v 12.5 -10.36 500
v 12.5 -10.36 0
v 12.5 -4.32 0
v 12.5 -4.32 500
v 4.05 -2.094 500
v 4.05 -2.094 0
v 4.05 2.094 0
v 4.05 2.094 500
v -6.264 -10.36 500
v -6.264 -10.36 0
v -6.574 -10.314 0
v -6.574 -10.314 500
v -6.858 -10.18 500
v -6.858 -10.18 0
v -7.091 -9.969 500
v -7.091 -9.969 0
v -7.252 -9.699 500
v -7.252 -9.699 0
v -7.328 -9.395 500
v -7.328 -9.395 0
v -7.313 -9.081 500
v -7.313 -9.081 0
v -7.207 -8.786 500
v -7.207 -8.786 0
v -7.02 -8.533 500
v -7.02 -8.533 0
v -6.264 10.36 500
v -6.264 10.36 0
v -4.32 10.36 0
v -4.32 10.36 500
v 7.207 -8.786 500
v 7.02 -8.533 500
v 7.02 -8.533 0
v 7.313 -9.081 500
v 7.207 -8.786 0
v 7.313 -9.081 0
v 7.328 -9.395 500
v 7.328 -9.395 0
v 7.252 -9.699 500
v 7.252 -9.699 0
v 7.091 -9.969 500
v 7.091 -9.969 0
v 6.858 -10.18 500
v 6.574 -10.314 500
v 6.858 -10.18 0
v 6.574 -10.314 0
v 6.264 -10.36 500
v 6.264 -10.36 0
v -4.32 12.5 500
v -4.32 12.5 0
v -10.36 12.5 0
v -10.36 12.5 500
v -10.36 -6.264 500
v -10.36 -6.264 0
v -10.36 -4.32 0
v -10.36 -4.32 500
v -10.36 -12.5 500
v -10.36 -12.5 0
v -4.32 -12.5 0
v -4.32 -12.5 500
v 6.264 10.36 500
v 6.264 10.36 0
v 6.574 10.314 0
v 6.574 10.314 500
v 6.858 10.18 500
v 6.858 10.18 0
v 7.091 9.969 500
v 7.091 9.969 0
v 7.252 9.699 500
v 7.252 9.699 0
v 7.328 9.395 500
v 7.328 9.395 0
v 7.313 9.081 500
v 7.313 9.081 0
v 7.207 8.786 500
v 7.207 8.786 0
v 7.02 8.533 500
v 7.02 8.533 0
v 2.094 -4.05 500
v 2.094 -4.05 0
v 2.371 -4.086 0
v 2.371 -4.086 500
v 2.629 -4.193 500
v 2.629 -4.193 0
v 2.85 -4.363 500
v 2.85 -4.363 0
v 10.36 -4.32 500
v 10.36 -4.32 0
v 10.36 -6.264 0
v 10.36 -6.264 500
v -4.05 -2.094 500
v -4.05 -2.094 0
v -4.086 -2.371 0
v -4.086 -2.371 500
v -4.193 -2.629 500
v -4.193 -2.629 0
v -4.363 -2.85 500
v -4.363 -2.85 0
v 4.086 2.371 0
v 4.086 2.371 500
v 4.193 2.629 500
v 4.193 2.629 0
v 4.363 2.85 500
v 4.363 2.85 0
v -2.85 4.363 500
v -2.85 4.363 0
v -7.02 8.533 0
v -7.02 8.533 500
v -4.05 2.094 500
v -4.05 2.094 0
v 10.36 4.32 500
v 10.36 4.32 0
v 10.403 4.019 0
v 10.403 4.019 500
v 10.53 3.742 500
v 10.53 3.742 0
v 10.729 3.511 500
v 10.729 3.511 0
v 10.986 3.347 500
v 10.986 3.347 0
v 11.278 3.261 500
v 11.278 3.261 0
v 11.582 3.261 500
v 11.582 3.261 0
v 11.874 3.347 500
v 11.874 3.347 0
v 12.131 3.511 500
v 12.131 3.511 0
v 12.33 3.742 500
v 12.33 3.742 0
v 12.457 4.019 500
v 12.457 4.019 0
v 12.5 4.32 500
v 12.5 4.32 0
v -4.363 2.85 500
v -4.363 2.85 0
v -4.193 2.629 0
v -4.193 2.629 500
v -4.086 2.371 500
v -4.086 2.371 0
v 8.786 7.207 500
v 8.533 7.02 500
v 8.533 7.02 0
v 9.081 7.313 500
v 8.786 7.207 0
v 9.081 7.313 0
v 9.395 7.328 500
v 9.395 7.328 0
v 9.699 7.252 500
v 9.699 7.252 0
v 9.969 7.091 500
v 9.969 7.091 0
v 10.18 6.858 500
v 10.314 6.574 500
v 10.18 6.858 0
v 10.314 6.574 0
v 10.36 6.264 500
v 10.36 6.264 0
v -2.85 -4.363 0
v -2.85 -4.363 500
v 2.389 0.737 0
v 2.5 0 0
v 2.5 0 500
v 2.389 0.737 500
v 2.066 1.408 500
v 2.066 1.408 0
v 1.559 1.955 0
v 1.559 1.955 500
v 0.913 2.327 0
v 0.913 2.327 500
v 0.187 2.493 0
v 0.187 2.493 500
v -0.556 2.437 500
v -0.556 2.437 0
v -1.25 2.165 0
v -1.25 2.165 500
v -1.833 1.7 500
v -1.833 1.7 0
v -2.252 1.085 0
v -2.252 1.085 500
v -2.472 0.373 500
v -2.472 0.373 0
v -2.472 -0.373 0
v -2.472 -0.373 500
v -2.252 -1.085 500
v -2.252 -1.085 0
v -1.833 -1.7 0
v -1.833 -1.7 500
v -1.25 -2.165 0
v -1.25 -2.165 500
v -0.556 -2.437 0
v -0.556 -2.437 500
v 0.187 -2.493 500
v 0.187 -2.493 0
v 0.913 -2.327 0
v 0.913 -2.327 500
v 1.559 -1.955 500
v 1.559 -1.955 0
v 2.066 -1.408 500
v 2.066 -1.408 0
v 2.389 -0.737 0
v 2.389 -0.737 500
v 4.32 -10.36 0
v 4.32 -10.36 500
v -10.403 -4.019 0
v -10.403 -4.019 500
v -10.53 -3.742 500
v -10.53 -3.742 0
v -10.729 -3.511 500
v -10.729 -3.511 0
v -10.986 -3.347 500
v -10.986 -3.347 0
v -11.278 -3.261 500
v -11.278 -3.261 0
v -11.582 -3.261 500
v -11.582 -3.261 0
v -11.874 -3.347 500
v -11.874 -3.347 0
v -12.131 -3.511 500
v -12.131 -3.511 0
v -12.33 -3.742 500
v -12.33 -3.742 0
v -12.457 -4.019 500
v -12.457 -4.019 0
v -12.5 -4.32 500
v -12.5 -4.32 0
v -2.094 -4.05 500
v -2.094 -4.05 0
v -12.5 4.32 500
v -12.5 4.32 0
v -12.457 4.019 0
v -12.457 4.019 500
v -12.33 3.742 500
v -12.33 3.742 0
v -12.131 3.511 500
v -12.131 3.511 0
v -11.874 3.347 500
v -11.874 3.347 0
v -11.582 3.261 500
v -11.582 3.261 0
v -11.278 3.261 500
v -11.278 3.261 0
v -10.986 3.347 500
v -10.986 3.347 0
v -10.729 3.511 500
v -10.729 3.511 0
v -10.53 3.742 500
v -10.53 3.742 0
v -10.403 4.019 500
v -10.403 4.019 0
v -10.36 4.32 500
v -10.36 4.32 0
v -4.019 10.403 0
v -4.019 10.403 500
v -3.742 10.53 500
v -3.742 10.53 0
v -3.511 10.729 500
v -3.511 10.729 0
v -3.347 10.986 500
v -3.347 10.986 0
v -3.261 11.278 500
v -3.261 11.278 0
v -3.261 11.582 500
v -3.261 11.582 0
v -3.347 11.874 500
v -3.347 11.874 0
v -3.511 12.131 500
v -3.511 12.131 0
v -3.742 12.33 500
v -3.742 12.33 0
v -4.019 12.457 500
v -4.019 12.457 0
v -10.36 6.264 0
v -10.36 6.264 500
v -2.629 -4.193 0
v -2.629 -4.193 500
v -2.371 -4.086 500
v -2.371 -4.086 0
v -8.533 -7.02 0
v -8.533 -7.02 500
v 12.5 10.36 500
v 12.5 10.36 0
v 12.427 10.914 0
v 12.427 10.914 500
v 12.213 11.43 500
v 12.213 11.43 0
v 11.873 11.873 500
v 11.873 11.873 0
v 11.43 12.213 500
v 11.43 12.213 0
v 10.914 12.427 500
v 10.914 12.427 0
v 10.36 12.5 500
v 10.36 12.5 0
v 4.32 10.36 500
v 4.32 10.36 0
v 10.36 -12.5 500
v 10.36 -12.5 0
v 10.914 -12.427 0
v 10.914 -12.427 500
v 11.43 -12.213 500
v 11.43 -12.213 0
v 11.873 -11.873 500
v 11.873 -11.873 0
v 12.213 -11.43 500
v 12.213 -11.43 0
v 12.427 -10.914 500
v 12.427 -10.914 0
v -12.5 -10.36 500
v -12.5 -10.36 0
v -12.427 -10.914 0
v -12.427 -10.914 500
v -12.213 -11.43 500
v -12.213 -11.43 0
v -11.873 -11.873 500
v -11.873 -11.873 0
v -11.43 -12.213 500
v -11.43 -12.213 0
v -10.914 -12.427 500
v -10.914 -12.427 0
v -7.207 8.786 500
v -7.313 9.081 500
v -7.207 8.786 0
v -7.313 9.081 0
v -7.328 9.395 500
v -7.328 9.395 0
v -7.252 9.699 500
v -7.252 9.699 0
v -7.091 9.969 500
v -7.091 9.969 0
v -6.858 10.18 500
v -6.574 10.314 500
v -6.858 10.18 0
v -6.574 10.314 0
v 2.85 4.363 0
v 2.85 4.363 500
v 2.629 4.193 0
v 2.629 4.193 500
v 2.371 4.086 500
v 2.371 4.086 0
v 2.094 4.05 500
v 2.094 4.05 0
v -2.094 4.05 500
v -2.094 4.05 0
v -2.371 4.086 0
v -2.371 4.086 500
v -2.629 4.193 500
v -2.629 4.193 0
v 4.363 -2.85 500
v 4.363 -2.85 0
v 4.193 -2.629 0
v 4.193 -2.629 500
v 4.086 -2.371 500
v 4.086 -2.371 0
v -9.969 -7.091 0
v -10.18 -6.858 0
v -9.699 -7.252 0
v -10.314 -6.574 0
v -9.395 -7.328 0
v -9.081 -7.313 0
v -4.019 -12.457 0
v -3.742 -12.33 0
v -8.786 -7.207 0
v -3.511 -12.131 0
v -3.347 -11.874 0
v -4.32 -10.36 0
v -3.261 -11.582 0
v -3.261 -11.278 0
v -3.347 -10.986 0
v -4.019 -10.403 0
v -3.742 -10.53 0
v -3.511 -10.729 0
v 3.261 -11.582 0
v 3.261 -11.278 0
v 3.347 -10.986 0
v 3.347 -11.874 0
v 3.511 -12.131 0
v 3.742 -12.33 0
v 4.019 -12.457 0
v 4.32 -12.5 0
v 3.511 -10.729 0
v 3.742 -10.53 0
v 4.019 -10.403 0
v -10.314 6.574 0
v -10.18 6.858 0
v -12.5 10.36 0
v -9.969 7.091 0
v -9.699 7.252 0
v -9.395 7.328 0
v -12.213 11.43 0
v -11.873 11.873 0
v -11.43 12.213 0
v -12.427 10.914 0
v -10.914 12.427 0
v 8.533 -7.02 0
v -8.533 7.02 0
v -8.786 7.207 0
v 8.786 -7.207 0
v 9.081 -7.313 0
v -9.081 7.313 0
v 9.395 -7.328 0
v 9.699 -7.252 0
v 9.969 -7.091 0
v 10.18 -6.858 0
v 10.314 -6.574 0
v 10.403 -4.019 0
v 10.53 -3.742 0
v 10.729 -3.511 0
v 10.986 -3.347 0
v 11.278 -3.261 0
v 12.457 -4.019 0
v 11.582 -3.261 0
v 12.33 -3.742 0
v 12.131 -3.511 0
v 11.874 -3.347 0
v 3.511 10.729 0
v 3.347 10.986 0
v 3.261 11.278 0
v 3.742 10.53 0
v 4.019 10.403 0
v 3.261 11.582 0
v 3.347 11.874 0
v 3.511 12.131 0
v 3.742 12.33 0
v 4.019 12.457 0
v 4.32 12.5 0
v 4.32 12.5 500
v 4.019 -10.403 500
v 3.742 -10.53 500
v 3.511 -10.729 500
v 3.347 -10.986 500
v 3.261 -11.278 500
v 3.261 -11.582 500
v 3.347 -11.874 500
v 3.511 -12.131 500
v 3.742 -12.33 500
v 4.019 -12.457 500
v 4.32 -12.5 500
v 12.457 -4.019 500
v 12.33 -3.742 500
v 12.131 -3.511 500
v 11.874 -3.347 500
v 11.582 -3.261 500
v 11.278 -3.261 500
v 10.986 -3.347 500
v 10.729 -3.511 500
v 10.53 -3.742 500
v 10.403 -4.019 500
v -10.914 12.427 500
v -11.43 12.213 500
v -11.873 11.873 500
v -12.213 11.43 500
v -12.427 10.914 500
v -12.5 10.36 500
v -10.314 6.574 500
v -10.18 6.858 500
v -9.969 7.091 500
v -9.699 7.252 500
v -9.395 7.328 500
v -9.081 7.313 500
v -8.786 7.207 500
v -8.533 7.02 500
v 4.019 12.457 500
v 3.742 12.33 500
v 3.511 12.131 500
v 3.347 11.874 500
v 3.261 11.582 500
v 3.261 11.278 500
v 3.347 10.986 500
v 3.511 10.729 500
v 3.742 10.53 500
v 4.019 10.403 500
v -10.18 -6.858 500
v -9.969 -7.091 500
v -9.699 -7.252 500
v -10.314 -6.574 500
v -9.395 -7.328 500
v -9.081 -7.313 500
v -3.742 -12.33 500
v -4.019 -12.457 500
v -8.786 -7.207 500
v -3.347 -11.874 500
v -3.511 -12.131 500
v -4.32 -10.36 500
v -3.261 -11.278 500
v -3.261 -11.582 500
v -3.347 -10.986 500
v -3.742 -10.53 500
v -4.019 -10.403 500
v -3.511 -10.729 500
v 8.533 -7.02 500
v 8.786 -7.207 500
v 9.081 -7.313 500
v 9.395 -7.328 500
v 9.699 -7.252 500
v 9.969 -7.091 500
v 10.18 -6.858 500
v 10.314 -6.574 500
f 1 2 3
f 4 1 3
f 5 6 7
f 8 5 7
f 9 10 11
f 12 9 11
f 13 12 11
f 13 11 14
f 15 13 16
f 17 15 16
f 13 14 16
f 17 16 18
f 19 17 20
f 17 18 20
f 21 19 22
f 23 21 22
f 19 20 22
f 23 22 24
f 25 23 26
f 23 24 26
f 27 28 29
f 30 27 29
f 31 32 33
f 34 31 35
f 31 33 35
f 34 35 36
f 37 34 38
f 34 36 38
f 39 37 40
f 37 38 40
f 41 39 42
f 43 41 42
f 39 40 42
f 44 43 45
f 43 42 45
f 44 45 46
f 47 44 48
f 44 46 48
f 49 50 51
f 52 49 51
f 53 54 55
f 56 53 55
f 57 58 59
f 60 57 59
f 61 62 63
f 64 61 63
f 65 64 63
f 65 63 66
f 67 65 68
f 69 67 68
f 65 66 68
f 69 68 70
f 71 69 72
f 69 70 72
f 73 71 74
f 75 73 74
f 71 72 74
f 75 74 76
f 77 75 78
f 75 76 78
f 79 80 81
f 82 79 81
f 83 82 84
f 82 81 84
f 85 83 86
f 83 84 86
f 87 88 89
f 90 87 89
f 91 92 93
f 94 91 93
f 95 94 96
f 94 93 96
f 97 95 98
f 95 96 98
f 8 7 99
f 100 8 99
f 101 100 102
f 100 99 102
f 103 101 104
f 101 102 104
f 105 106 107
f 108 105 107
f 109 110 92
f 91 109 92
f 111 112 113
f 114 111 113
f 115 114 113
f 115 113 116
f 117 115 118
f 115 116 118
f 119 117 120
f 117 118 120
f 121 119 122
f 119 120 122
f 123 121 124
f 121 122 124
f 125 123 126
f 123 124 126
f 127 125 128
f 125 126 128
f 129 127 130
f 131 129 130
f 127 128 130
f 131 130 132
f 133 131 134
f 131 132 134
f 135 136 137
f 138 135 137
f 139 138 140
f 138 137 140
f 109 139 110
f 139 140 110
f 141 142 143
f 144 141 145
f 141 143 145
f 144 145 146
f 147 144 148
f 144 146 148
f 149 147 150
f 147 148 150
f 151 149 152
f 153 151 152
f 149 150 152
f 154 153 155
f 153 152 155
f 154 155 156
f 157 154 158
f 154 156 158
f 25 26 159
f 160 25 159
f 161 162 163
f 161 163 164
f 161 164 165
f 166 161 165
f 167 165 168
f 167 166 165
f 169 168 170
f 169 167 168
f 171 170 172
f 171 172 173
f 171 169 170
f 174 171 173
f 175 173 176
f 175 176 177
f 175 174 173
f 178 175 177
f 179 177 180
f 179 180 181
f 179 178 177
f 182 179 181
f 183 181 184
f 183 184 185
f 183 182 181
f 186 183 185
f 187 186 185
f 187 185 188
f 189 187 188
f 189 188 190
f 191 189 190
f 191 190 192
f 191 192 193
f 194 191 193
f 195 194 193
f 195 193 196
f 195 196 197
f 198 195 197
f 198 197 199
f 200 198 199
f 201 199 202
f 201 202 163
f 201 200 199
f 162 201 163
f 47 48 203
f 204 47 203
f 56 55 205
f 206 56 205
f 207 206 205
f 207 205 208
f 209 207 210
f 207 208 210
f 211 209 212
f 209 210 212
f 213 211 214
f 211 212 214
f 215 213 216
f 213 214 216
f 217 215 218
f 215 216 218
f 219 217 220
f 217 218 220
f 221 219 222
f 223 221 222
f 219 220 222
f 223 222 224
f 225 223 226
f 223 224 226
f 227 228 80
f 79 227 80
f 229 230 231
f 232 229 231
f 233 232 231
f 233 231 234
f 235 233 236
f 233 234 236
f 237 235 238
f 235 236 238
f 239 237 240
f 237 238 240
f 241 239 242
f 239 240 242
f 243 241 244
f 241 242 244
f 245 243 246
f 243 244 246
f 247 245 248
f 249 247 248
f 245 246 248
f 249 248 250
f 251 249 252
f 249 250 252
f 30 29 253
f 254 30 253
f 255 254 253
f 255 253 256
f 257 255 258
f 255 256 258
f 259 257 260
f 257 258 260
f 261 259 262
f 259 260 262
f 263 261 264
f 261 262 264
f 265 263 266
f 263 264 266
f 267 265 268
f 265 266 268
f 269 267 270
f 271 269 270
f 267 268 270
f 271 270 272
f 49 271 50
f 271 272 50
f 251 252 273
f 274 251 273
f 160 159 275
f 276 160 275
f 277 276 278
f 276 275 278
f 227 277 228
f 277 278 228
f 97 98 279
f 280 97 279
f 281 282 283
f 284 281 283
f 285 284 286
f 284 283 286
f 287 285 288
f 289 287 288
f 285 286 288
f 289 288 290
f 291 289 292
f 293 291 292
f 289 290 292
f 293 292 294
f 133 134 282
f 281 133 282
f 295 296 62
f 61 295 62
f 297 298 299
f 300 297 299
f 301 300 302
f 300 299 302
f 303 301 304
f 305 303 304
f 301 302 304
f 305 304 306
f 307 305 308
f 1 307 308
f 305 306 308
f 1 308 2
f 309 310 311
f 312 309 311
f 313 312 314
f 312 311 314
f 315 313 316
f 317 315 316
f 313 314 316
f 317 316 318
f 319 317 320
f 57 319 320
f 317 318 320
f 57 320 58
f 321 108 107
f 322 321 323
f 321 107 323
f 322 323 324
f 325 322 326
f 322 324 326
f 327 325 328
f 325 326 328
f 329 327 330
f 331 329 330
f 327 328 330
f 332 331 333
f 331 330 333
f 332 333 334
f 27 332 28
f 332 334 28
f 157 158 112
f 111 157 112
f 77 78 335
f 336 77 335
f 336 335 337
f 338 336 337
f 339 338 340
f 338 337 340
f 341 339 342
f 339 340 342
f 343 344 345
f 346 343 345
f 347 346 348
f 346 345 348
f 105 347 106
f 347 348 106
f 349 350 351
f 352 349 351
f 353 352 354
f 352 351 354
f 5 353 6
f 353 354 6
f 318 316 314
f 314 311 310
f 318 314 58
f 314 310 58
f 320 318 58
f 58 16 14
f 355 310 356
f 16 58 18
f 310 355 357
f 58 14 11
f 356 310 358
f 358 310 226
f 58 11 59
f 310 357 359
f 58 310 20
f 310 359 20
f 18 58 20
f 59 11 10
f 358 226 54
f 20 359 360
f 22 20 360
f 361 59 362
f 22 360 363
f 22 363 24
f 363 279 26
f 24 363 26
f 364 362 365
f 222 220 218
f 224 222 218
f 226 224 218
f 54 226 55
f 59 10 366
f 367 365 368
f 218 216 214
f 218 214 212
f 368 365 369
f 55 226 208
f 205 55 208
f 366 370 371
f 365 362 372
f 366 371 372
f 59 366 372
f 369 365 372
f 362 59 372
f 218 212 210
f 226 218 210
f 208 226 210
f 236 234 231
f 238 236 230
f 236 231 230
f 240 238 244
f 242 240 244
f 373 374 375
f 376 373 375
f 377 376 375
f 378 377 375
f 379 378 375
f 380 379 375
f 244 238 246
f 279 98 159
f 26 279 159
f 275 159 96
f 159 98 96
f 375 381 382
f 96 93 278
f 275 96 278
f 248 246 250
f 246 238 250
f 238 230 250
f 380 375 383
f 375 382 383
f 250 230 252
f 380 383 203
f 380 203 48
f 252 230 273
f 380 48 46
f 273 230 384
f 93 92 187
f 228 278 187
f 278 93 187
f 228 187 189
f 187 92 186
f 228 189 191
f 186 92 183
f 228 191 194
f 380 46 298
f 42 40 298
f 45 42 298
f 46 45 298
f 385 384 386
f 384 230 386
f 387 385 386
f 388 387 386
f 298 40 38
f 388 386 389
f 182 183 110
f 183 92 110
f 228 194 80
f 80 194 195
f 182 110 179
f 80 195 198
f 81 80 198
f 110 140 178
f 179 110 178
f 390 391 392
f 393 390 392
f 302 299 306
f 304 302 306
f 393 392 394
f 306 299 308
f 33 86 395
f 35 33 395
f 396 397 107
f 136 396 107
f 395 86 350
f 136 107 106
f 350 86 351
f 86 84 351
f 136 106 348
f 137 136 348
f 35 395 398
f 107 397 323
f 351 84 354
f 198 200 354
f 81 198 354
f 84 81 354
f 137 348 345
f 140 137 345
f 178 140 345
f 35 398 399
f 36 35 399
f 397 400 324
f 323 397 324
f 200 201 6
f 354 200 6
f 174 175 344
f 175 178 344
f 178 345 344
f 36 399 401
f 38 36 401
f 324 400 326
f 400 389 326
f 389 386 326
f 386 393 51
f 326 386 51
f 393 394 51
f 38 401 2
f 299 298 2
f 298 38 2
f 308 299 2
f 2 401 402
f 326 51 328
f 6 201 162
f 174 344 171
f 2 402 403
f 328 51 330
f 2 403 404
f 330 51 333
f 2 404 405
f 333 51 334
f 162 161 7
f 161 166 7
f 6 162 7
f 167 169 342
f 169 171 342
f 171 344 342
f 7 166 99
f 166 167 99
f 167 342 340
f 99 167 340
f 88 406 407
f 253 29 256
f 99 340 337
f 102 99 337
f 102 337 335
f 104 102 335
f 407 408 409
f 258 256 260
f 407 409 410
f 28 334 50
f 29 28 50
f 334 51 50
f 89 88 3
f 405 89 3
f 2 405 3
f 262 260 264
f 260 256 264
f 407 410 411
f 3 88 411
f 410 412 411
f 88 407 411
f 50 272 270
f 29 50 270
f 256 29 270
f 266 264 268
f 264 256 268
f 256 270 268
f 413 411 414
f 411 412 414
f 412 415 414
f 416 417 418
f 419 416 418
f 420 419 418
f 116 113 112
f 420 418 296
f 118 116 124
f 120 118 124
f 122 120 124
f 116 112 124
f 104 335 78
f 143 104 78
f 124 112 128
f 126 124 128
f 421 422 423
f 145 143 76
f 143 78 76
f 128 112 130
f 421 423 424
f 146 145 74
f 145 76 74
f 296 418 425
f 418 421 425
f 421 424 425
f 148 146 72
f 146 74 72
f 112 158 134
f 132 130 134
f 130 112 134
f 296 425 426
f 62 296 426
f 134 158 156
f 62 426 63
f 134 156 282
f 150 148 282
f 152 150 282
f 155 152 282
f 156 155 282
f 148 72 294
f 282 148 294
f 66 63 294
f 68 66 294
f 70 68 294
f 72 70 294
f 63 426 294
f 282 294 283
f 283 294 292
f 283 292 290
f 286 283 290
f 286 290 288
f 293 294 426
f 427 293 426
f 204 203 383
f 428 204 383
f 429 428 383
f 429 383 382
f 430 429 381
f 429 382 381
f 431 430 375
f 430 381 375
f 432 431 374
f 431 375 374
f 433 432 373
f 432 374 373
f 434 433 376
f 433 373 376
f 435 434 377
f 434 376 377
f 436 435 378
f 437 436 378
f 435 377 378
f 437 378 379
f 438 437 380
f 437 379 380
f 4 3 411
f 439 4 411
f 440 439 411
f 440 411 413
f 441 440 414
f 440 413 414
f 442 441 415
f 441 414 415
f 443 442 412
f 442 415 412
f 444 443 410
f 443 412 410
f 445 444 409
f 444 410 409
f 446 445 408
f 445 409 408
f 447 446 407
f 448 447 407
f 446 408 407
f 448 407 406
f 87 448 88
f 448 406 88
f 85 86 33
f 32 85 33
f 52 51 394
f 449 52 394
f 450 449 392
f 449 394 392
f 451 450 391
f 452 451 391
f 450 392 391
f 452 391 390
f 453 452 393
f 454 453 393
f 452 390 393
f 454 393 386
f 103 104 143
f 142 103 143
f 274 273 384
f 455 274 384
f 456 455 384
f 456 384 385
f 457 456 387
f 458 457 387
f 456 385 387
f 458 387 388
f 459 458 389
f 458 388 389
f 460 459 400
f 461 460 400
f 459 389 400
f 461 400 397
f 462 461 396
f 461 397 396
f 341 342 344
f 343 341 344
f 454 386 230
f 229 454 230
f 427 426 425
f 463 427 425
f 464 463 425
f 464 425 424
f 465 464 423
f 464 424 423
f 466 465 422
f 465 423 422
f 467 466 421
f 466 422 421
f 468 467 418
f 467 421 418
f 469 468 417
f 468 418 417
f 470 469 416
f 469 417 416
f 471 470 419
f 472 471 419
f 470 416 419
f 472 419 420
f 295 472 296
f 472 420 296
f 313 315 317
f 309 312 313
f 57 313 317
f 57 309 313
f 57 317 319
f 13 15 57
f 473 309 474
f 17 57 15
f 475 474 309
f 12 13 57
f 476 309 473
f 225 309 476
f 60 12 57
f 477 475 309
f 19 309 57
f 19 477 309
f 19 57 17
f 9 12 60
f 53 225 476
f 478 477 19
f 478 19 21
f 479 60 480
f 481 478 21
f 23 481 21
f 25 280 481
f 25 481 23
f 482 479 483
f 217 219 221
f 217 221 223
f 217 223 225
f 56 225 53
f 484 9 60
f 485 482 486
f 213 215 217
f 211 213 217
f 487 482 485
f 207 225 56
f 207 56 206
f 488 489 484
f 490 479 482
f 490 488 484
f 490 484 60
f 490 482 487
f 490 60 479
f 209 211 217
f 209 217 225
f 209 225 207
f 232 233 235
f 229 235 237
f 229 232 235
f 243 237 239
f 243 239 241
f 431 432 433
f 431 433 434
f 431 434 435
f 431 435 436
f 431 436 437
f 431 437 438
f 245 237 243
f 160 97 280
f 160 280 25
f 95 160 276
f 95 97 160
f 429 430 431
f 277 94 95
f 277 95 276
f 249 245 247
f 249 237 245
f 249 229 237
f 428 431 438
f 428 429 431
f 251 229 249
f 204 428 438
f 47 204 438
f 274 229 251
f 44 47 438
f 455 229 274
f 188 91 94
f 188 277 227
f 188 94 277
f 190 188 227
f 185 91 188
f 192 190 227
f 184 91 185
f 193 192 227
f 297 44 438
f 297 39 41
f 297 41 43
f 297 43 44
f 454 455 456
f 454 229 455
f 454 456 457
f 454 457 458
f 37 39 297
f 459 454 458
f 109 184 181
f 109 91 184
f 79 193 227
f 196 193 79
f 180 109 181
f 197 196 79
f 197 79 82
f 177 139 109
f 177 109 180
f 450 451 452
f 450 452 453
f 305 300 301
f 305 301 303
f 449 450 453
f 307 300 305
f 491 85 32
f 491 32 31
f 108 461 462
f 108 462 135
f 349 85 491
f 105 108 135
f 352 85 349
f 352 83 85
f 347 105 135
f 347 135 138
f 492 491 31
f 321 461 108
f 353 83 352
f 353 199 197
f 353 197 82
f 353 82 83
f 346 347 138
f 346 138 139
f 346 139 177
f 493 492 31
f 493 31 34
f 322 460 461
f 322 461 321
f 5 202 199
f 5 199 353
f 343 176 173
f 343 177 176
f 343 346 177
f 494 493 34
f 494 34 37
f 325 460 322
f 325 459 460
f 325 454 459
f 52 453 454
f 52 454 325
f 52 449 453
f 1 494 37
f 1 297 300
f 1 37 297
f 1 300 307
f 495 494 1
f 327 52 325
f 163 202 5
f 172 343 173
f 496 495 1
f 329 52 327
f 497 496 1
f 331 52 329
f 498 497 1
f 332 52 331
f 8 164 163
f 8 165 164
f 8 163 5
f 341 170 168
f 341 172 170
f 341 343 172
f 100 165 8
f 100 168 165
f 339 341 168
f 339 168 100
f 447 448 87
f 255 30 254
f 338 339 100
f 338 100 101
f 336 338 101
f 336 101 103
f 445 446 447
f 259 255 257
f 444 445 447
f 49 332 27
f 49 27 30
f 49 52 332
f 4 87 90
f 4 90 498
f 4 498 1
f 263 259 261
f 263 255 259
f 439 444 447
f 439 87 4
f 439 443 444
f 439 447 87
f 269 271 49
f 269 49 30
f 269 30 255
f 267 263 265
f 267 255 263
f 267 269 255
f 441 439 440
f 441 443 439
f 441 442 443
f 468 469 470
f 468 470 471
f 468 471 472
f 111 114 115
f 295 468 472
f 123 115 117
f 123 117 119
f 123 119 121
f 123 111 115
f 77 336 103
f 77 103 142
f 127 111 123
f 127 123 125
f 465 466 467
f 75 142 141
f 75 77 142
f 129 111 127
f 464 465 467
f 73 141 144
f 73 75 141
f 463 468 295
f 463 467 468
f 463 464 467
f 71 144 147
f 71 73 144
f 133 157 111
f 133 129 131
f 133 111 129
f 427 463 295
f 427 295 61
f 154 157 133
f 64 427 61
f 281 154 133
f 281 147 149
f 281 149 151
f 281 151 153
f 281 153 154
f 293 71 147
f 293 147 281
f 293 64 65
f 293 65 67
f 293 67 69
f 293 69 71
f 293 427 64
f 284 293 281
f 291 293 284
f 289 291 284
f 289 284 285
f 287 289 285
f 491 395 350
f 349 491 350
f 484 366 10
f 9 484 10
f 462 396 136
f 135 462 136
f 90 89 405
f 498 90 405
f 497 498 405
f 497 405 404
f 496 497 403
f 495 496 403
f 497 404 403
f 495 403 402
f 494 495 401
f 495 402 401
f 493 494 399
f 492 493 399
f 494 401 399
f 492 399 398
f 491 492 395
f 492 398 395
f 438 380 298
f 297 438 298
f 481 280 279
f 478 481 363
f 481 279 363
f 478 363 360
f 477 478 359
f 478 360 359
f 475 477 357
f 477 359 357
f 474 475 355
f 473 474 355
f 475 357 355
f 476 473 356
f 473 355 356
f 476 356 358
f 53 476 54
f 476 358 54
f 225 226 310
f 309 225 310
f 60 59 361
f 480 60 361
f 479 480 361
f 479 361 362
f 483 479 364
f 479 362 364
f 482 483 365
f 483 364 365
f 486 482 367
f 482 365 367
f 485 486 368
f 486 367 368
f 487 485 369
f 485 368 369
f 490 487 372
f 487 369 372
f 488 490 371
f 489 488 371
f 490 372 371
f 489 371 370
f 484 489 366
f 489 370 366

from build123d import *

# Parameters (mm, degrees)
F0_R     = 2.5
F1_DEPTH = 500


with BuildPart() as f1:
    # F0 (on Top) → F1 (new body)
    with BuildSketch(Plane.XY):
        with BuildLine():
            ThreePointArc((-10.36, 12.5), (-11.873209, 11.873209), (-12.5, 10.36))
            Line((-12.5, 10.36), (-12.5, 4.32))
            ThreePointArc((-12.5, 4.32), (-11.43, 3.25), (-10.36, 4.32))
            Line((-10.36, 4.32), (-10.36, 6.263583))
            ThreePointArc((-10.36, 6.263583), (-9.699471, 7.252134), (-8.533396, 7.020187))
            Line((-8.533396, 7.020187), (-4.363396, 2.850187))
            ThreePointArc((-4.363396, 2.850187), (-4.131449, 2.503054), (-4.05, 2.093583))
            Line((-4.05, 2.093583), (-4.05, 0))
            Line((-4.05, 0), (-4.05, -2.093583))
            ThreePointArc((-4.05, -2.093583), (-4.131449, -2.503054), (-4.363396, -2.850187))
            Line((-4.363396, -2.850187), (-8.533396, -7.020187))
            ThreePointArc((-8.533396, -7.020187), (-9.699471, -7.252134), (-10.36, -6.263583))
            Line((-10.36, -6.263583), (-10.36, -4.32))
            ThreePointArc((-10.36, -4.32), (-11.43, -3.25), (-12.5, -4.32))
            Line((-12.5, -4.32), (-12.5, -10.36))
            ThreePointArc((-12.5, -10.36), (-11.873209, -11.873209), (-10.36, -12.5))
            Line((-10.36, -12.5), (-4.32, -12.5))
            ThreePointArc((-4.32, -12.5), (-3.25, -11.43), (-4.32, -10.36))
            Line((-4.32, -10.36), (-6.263583, -10.36))
            ThreePointArc((-6.263583, -10.36), (-7.252134, -9.699471), (-7.020187, -8.533396))
            Line((-7.020187, -8.533396), (-2.850187, -4.363396))
            ThreePointArc((-2.850187, -4.363396), (-2.503054, -4.131449), (-2.093583, -4.05))
            Line((-2.093583, -4.05), (0, -4.05))
            Line((0, -4.05), (2.093583, -4.05))
            ThreePointArc((2.093583, -4.05), (2.503054, -4.131449), (2.850187, -4.363396))
            Line((2.850187, -4.363396), (7.020187, -8.533396))
            ThreePointArc((7.020187, -8.533396), (7.252134, -9.699471), (6.263583, -10.36))
            Line((6.263583, -10.36), (4.32, -10.36))
            ThreePointArc((4.32, -10.36), (3.25, -11.43), (4.32, -12.5))
            Line((4.32, -12.5), (10.36, -12.5))
            ThreePointArc((10.36, -12.5), (11.873209, -11.873209), (12.5, -10.36))
            Line((12.5, -10.36), (12.5, -4.32))
            ThreePointArc((12.5, -4.32), (11.43, -3.25), (10.36, -4.32))
            Line((10.36, -4.32), (10.36, -6.263583))
            ThreePointArc((10.36, -6.263583), (9.699471, -7.252134), (8.533396, -7.020187))
            Line((8.533396, -7.020187), (4.363396, -2.850187))
            ThreePointArc((4.363396, -2.850187), (4.131449, -2.503054), (4.05, -2.093583))
            Line((4.05, -2.093583), (4.05, 0))
            Line((4.05, 0), (4.05, 2.093583))
            ThreePointArc((4.05, 2.093583), (4.131449, 2.503054), (4.363396, 2.850187))
            Line((4.363396, 2.850187), (8.533396, 7.020187))
            ThreePointArc((8.533396, 7.020187), (9.699471, 7.252134), (10.36, 6.263583))
            Line((10.36, 6.263583), (10.36, 4.32))
            ThreePointArc((10.36, 4.32), (11.43, 3.25), (12.5, 4.32))
            Line((12.5, 4.32), (12.5, 10.36))
            ThreePointArc((12.5, 10.36), (11.873209, 11.873209), (10.36, 12.5))
            Line((10.36, 12.5), (4.32, 12.5))
            ThreePointArc((4.32, 12.5), (3.25, 11.43), (4.32, 10.36))
            Line((4.32, 10.36), (6.263583, 10.36))
            ThreePointArc((6.263583, 10.36), (7.252134, 9.699471), (7.020187, 8.533396))
            Line((7.020187, 8.533396), (2.850187, 4.363396))
            ThreePointArc((2.850187, 4.363396), (2.503054, 4.131449), (2.093583, 4.05))
            Line((2.093583, 4.05), (0, 4.05))
            Line((0, 4.05), (-2.093583, 4.05))
            ThreePointArc((-2.093583, 4.05), (-2.503054, 4.131449), (-2.850187, 4.363396))
            Line((-2.850187, 4.363396), (-7.020187, 8.533396))
            ThreePointArc((-7.020187, 8.533396), (-7.252134, 9.699471), (-6.263583, 10.36))
            Line((-6.263583, 10.36), (-4.32, 10.36))
            ThreePointArc((-4.32, 10.36), (-3.25, 11.43), (-4.32, 12.5))
            Line((-4.32, 12.5), (-10.36, 12.5))
        make_face()
        Circle(F0_R, mode=Mode.SUBTRACT)
    extrude(amount=F1_DEPTH)


solid = f1.part
